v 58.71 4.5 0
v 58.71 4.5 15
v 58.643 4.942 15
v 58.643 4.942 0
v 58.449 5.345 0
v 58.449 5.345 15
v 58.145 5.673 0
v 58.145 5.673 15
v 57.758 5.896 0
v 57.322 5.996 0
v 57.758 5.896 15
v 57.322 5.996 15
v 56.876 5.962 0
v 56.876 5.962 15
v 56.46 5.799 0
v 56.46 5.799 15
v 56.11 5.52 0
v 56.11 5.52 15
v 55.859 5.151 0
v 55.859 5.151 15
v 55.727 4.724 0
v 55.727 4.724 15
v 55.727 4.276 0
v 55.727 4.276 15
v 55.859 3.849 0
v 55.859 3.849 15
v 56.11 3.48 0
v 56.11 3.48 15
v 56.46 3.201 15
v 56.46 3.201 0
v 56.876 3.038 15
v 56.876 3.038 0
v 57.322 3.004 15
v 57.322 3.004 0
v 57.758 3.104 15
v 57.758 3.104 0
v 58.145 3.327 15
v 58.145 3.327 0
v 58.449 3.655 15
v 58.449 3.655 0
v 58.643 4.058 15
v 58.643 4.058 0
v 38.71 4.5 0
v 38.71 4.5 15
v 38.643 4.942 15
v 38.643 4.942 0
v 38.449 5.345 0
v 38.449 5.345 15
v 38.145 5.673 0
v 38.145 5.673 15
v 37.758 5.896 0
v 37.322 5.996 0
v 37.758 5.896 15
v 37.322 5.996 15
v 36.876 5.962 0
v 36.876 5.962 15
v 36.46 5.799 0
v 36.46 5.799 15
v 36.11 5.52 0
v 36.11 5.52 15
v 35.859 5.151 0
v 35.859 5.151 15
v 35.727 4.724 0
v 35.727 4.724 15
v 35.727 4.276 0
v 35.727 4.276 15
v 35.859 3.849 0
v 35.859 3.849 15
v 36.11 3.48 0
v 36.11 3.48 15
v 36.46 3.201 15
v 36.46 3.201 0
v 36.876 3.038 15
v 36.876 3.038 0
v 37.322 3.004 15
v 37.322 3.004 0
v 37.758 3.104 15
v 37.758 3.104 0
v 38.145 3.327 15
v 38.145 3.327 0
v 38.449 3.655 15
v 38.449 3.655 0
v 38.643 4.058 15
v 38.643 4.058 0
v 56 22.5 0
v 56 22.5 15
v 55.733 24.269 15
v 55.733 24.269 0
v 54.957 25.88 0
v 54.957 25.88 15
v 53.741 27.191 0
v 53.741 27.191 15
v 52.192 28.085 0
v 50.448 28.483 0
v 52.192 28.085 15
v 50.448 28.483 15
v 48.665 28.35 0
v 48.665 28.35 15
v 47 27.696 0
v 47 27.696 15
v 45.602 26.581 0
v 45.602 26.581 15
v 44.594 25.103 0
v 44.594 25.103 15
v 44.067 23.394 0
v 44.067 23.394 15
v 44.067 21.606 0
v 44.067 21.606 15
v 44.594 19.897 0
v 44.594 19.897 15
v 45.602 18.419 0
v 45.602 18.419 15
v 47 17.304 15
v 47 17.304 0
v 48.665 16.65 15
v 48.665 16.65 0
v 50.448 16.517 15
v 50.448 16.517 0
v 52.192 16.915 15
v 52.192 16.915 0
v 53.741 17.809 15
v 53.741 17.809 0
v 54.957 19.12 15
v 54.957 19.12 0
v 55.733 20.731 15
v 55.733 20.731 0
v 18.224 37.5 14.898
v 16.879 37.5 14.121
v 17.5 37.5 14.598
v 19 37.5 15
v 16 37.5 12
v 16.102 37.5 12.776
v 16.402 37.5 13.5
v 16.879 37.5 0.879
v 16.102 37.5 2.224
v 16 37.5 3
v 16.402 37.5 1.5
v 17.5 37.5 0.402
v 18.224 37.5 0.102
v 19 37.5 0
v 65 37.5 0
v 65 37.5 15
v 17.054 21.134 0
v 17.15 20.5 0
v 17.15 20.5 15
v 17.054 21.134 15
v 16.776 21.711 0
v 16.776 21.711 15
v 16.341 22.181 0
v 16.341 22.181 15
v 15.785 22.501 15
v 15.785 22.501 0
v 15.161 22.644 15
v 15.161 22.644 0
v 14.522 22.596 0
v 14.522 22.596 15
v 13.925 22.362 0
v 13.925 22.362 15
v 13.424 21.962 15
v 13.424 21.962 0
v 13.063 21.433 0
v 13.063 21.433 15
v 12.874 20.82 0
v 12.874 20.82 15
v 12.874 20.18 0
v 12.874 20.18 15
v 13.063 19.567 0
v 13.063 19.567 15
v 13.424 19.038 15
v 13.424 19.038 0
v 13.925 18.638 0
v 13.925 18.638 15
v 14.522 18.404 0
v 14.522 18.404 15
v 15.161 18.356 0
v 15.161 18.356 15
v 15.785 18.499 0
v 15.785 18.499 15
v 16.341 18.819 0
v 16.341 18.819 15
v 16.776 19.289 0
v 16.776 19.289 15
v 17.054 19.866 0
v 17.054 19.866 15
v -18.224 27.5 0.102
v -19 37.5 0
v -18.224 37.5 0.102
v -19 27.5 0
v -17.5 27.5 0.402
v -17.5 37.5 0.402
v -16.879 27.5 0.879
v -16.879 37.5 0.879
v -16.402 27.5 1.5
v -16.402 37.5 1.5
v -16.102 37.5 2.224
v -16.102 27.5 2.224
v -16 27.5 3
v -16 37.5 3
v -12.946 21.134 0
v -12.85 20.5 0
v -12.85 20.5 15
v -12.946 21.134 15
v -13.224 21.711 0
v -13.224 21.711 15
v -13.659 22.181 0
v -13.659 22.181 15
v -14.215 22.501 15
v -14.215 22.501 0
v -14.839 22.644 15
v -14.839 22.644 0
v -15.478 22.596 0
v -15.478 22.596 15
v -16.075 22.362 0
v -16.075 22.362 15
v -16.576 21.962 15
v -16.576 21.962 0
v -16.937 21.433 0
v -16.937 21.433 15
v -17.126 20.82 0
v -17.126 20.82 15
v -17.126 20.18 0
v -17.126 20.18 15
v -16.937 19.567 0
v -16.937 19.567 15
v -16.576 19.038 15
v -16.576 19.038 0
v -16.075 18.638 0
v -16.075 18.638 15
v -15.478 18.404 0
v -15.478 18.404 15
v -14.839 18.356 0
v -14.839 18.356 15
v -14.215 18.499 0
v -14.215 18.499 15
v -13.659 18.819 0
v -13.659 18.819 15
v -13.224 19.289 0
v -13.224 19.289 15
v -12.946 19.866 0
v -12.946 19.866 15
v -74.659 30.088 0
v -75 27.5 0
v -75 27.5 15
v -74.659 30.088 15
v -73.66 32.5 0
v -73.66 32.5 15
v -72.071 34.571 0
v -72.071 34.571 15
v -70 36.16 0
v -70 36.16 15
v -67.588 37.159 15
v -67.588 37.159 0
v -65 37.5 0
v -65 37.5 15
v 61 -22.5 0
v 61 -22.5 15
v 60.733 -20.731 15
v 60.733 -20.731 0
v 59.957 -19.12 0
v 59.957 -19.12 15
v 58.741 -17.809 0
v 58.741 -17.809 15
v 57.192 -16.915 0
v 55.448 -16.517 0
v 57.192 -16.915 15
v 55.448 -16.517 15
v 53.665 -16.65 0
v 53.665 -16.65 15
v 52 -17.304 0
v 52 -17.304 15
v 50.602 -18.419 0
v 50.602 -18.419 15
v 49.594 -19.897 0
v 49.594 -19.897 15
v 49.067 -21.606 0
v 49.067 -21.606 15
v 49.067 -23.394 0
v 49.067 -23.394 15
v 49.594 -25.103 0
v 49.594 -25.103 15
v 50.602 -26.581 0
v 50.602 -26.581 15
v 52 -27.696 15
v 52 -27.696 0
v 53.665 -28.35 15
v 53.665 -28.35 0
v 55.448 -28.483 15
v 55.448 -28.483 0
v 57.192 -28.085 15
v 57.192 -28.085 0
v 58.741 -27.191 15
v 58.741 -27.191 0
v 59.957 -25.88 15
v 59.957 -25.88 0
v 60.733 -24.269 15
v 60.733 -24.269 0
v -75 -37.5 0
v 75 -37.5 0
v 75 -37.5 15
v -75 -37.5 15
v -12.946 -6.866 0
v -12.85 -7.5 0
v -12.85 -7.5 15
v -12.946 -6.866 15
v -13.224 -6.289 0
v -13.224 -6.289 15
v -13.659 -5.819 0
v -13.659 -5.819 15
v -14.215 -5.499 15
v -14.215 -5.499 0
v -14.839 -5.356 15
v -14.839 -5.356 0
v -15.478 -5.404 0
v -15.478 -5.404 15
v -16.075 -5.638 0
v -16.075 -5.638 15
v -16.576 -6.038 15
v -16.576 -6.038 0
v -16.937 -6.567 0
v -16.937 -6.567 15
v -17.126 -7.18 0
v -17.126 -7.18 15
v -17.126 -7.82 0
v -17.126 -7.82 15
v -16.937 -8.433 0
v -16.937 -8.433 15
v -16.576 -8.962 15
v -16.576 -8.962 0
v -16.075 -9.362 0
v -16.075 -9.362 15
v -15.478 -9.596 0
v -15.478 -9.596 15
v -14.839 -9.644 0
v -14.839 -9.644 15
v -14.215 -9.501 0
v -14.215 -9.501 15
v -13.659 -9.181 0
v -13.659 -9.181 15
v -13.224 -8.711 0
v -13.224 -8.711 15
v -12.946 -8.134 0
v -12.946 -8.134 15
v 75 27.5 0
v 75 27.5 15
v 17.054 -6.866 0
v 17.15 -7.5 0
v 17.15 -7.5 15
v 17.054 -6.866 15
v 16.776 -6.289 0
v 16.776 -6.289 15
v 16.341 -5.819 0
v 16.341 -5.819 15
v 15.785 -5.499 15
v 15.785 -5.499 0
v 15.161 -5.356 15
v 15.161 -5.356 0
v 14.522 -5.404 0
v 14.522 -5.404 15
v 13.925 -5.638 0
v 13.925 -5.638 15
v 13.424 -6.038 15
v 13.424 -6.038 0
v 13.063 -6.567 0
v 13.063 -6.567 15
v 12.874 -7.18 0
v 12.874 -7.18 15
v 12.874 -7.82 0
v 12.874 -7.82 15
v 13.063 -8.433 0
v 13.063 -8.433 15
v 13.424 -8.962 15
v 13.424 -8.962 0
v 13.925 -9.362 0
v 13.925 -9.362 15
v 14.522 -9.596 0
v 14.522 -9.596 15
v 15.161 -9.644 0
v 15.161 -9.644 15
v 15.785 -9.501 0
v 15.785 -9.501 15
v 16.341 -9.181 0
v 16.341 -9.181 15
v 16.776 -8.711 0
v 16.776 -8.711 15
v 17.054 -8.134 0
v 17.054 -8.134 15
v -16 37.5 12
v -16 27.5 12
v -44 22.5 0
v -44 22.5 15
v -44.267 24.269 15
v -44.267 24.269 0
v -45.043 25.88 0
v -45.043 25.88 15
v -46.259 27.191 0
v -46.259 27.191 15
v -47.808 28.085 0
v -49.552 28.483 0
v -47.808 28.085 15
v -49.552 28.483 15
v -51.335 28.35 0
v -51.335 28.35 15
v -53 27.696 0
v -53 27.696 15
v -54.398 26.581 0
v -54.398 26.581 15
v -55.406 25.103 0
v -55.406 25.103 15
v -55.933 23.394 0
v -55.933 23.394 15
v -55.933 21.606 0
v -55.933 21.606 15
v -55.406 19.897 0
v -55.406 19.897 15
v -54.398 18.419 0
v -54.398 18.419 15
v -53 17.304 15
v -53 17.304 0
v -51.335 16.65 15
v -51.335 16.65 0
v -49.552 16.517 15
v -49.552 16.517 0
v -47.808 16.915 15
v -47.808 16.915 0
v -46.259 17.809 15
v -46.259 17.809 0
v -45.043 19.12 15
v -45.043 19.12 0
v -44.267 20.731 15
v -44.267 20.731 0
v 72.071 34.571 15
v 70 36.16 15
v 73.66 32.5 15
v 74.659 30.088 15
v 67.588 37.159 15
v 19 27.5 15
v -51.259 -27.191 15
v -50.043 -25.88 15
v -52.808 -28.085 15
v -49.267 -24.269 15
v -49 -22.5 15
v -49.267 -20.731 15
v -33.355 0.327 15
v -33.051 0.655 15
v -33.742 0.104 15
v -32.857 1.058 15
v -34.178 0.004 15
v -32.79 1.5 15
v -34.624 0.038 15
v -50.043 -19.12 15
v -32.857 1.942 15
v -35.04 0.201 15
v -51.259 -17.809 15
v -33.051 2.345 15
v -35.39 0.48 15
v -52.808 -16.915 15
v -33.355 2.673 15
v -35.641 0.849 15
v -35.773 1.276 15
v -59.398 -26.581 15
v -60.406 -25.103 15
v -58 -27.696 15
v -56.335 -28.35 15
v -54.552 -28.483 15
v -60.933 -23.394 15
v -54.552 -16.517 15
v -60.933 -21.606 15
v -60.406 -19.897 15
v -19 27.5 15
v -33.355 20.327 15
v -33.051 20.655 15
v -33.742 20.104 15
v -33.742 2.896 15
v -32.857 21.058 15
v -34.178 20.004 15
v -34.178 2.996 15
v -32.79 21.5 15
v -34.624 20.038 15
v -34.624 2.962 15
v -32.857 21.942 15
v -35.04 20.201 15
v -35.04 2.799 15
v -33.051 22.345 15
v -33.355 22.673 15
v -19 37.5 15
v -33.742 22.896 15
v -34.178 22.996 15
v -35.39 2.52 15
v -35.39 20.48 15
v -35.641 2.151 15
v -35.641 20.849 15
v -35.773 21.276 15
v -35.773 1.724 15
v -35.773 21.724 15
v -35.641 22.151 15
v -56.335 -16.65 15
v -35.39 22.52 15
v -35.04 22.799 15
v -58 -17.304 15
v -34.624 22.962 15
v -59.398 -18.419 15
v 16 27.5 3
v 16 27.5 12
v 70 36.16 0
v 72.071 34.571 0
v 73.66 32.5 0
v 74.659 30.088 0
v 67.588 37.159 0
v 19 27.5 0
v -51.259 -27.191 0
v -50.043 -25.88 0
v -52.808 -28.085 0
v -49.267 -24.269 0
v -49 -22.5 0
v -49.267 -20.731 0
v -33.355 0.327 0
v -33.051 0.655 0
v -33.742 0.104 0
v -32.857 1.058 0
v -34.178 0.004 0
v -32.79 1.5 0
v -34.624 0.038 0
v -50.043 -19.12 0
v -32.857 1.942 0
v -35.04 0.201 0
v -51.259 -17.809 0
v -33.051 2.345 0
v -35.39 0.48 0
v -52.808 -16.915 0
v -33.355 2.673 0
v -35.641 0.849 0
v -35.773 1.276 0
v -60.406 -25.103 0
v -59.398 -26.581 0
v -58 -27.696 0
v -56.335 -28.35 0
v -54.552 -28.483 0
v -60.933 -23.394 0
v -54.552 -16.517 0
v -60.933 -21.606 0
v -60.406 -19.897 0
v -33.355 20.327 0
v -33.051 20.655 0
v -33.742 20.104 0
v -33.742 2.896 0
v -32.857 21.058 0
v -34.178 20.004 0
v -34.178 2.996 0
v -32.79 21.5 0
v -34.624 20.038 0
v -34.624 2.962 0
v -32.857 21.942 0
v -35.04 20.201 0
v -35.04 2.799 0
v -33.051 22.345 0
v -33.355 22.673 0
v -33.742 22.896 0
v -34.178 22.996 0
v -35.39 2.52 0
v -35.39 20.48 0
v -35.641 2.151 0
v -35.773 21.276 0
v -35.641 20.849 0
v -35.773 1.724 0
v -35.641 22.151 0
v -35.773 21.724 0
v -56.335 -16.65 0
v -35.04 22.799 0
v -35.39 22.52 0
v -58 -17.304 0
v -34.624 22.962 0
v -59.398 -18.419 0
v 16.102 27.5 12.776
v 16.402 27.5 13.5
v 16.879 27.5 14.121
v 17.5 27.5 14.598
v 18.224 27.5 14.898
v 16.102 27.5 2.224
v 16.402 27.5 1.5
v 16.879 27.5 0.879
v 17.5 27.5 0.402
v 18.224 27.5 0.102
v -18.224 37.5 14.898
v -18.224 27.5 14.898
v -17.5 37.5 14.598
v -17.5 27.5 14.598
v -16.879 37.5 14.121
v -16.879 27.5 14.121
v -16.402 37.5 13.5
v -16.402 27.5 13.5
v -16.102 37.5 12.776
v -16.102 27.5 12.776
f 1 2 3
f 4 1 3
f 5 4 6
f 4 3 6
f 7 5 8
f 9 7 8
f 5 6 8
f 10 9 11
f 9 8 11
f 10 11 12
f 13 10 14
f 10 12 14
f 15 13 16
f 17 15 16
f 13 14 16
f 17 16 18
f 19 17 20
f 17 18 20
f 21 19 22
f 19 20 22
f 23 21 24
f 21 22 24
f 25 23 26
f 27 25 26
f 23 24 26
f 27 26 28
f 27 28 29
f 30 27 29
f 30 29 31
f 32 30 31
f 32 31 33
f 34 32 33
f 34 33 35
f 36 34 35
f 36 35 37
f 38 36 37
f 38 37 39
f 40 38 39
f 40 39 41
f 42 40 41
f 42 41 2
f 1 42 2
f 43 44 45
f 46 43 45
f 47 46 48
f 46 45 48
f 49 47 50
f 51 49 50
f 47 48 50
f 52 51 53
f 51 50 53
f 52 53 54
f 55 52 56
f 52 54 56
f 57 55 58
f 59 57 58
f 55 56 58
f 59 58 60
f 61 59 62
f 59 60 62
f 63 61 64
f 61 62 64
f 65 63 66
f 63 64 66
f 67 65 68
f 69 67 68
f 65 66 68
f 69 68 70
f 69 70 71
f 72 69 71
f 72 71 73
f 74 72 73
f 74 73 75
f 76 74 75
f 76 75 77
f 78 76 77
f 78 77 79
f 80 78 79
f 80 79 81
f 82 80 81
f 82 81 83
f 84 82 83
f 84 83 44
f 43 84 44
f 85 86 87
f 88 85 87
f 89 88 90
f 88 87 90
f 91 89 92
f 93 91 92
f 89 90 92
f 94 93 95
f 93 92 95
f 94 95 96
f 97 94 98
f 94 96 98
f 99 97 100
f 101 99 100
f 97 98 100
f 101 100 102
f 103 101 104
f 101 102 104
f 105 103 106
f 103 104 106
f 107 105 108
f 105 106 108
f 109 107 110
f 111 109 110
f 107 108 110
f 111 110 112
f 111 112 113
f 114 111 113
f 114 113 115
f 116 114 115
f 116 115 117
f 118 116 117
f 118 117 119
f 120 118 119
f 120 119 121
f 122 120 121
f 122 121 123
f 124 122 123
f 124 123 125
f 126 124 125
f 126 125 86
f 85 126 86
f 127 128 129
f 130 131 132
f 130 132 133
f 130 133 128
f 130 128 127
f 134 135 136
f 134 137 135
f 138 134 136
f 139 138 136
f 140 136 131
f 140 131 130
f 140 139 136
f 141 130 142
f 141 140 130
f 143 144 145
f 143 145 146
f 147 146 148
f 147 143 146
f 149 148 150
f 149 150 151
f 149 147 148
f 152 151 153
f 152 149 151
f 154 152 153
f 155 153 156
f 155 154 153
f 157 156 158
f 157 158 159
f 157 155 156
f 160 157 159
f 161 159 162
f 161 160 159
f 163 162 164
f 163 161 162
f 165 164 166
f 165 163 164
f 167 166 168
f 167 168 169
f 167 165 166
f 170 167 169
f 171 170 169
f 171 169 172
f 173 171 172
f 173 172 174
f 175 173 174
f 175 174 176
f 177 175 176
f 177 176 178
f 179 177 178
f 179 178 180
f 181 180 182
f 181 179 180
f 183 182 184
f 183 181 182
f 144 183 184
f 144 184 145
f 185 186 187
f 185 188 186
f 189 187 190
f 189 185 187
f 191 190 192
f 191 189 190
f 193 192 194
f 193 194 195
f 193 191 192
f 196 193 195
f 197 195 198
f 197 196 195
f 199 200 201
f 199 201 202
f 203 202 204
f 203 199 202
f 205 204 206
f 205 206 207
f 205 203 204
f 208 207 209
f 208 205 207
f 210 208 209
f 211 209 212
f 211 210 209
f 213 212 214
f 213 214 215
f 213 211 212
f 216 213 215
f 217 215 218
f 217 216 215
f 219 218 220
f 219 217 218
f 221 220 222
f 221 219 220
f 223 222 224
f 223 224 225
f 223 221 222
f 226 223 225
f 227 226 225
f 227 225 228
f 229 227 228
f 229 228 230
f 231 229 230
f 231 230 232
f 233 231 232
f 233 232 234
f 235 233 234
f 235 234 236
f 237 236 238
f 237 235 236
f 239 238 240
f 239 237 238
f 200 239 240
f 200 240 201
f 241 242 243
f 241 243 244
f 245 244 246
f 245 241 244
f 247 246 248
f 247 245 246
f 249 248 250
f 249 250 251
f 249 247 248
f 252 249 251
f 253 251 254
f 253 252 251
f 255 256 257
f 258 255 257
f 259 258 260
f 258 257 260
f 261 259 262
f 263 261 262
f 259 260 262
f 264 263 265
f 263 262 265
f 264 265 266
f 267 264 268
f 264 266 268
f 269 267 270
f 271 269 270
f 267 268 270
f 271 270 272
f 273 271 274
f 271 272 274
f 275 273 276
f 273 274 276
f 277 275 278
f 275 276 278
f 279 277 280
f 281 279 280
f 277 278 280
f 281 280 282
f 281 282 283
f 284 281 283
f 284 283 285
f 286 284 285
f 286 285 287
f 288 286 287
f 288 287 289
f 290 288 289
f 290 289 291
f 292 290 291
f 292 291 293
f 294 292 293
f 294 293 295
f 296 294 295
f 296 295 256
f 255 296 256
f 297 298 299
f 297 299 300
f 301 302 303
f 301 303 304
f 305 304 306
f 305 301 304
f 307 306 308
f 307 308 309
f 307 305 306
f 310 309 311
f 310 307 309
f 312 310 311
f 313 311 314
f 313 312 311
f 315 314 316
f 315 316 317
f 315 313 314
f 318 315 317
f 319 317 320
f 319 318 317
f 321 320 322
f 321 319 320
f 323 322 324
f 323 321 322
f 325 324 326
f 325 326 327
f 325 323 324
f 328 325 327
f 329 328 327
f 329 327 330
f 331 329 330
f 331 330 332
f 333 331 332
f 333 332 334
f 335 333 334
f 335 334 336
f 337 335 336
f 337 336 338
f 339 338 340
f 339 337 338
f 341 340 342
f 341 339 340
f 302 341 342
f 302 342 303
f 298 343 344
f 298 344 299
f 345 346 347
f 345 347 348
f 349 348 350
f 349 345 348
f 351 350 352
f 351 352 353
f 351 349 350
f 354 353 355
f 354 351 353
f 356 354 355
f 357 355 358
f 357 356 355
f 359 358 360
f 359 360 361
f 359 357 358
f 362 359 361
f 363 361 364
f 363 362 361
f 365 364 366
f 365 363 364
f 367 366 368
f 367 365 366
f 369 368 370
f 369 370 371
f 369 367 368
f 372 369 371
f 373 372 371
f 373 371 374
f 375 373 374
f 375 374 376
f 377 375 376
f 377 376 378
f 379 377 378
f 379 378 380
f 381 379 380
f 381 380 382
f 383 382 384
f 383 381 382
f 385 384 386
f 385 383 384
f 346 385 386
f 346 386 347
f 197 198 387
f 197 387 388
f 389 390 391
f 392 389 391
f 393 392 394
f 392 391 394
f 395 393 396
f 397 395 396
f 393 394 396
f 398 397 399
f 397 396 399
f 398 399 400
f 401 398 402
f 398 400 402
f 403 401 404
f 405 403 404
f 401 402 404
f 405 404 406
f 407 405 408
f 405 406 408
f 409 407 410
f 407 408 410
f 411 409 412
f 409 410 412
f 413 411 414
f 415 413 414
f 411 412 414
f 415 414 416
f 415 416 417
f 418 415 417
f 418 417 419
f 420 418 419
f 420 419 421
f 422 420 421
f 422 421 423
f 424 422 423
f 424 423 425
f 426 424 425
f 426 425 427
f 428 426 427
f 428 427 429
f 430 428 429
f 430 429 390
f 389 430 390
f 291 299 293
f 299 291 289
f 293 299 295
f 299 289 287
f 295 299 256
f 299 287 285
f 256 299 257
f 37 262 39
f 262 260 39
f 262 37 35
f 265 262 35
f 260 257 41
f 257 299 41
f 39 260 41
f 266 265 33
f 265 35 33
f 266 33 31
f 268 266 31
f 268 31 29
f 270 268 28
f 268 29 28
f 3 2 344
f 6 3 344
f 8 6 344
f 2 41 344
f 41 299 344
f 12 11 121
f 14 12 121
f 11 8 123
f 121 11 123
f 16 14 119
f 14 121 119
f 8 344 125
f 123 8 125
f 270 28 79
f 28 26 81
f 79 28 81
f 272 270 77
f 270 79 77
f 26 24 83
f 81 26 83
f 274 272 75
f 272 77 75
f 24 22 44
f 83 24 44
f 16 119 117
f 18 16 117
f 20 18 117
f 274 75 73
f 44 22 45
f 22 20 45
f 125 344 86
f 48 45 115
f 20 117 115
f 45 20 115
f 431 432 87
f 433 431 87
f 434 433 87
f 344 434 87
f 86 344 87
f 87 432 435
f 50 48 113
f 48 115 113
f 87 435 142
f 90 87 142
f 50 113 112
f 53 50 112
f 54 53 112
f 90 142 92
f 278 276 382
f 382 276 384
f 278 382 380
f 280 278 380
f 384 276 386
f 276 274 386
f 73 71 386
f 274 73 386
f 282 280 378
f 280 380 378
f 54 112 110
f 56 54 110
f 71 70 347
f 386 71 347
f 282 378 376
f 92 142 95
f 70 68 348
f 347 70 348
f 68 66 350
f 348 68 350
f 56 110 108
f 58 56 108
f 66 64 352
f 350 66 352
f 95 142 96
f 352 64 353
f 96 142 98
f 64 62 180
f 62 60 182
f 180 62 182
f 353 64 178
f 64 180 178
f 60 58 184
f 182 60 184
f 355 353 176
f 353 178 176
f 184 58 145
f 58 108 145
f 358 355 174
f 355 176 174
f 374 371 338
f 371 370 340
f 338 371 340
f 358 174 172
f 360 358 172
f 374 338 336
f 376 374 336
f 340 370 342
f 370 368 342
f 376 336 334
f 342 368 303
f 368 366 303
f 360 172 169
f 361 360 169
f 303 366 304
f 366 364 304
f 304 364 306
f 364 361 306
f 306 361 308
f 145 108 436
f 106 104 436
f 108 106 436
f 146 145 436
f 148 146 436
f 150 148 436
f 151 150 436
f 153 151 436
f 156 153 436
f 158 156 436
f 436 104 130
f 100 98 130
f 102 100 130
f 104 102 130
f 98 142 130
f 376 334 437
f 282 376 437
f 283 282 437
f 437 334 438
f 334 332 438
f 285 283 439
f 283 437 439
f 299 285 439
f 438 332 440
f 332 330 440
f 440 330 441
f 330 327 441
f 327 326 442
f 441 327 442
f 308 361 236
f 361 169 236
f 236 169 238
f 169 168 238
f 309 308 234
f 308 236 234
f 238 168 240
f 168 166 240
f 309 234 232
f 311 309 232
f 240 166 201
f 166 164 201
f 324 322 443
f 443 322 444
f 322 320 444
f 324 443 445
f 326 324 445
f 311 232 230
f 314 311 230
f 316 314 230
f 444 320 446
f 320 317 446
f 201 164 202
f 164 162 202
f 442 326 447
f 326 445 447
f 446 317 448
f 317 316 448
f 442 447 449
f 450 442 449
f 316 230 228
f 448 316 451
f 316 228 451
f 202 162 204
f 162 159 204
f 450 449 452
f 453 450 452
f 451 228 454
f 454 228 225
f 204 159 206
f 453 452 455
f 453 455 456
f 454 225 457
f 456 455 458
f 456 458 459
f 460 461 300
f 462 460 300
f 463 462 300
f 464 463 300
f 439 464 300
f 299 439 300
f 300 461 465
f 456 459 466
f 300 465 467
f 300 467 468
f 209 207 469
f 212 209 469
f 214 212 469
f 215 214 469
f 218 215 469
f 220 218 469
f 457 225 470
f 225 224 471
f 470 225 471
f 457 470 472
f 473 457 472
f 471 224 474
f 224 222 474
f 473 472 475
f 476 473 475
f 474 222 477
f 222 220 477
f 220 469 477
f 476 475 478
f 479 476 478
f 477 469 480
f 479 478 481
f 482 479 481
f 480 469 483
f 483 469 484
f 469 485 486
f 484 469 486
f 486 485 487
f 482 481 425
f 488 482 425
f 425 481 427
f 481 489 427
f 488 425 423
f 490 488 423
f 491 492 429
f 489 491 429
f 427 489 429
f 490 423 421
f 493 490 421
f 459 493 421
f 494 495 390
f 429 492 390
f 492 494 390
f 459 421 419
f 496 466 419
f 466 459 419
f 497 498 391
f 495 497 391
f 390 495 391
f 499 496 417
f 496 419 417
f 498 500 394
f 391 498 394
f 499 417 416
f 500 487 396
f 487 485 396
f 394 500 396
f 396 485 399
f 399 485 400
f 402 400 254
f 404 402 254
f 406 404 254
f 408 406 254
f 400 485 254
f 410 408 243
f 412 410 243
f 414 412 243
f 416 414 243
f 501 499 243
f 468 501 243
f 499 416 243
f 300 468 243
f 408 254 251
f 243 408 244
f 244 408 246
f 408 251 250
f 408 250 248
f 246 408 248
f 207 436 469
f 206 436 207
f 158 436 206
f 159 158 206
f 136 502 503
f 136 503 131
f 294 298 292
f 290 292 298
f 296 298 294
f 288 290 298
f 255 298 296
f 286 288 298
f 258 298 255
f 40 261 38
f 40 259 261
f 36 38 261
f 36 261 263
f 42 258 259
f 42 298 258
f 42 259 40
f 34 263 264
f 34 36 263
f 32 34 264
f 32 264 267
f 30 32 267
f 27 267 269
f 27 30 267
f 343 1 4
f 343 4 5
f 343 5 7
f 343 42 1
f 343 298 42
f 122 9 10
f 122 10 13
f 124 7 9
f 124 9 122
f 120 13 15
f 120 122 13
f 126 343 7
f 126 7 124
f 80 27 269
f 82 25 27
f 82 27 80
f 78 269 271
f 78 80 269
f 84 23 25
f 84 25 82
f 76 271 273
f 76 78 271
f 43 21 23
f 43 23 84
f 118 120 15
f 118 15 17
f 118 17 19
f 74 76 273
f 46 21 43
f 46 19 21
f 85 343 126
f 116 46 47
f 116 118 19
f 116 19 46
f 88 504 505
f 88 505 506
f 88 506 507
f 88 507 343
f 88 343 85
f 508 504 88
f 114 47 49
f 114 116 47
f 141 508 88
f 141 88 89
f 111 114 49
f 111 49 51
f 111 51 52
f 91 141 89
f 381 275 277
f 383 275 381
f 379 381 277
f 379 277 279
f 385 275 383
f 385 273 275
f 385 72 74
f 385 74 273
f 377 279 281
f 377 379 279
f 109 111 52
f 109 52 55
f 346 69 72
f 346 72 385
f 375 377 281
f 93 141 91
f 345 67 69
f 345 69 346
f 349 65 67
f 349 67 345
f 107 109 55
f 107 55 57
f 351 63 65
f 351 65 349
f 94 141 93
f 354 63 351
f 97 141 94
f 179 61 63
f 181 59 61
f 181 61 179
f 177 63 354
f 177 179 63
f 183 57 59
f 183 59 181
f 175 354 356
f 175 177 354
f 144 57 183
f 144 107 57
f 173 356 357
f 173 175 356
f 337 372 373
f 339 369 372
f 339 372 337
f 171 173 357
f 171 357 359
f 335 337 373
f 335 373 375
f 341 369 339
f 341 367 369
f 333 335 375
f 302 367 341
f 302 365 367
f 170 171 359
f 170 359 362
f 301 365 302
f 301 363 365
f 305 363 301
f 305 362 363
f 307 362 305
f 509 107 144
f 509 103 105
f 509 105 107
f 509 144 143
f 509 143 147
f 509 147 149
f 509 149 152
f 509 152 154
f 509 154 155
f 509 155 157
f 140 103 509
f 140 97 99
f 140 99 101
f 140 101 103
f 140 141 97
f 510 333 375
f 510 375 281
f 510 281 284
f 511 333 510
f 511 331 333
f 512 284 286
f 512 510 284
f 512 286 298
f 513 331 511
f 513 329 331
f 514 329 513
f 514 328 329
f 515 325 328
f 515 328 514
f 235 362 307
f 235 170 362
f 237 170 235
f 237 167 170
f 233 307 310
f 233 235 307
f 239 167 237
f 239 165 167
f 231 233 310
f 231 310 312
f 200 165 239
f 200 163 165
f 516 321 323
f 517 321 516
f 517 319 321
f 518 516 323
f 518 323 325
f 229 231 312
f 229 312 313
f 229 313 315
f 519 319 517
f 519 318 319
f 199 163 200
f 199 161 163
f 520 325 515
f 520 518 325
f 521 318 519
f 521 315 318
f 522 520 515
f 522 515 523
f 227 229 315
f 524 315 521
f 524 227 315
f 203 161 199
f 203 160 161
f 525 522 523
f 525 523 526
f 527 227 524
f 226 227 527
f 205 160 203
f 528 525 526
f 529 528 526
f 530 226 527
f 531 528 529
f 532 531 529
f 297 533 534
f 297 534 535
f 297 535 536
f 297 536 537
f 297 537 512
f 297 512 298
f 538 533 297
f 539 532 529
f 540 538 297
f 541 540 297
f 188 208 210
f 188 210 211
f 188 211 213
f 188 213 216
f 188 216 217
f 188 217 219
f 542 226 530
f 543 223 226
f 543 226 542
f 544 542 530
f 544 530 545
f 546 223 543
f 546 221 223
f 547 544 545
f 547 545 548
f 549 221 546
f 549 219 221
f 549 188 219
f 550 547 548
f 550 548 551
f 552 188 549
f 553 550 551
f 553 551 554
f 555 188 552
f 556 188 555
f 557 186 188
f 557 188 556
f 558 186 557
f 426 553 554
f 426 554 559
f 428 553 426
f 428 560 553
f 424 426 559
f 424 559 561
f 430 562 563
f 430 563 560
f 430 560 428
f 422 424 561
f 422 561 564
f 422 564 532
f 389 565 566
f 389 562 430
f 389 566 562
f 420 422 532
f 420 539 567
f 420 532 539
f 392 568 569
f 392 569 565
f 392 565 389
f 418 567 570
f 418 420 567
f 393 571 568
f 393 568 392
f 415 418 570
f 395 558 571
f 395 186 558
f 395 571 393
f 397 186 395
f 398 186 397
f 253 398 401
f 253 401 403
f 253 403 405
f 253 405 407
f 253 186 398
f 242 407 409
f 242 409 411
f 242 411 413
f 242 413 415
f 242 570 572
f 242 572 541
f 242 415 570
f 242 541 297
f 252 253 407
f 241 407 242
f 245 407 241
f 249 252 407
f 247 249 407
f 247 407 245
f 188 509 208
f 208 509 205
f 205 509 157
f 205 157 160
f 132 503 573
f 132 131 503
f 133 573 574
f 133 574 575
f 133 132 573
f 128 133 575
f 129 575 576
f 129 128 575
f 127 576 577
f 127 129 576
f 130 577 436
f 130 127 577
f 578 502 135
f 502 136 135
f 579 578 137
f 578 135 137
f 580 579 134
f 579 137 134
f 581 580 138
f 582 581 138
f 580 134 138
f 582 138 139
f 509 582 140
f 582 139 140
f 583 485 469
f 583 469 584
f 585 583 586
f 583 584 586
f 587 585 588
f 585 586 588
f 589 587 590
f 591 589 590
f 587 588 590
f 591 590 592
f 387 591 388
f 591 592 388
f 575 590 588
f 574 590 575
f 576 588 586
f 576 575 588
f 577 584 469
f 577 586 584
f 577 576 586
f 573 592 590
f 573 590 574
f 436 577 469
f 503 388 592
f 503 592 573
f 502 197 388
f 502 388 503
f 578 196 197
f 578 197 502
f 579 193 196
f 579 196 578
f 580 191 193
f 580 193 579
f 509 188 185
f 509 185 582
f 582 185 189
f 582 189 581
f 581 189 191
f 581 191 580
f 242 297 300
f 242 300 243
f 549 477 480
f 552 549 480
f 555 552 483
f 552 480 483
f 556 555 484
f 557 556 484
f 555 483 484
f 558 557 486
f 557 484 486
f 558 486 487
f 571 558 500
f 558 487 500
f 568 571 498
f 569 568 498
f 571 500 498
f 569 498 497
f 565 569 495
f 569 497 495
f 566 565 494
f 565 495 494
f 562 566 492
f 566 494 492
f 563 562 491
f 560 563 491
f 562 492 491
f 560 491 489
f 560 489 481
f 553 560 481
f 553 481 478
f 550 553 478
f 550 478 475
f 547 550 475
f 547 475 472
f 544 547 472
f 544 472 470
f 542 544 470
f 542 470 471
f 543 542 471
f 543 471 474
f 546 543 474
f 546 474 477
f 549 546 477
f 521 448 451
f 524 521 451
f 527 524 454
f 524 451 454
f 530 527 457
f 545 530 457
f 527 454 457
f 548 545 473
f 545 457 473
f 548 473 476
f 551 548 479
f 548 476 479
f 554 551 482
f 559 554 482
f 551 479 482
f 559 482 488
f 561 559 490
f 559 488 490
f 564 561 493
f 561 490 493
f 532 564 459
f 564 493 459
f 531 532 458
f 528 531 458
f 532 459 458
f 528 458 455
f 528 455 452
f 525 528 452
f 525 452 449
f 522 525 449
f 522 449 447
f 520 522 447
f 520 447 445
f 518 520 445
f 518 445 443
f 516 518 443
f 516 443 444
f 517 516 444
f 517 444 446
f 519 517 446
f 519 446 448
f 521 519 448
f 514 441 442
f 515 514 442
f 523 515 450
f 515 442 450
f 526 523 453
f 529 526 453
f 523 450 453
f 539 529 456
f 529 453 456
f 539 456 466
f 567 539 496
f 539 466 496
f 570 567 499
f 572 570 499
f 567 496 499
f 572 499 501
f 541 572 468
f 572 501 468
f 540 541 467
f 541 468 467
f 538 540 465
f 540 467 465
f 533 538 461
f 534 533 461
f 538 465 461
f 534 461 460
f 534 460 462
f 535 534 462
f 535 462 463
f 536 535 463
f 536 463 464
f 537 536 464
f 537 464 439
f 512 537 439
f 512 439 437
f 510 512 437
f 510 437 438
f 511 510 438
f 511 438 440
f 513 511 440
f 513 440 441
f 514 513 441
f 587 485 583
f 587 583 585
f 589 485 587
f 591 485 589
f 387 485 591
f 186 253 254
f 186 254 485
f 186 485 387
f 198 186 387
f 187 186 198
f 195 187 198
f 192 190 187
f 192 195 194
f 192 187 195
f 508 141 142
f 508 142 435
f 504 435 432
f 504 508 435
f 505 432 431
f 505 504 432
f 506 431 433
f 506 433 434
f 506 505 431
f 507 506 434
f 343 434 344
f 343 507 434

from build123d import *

# Parameters (mm, degrees)
SKETCH_1_R          = 2.15
EXTRUDE_1_DEPTH     = 15
SKETCH_2_R          = 6
CUT_EXTRUDE_1_DEPTH = 86.183625187
FILLET_1_R          = 3
SKETCH_3_R          = 1.5
CUT_EXTRUDE_2_DEPTH = 86.183625187
SKETCH_4_R          = 1.5
CUT_EXTRUDE_3_DEPTH = 86.183625187


with BuildPart() as part:
    # 草图1 → 凸台-拉伸1 (new body)
    with BuildSketch(Plane.XY):
        with BuildLine():
            Line((16, 37.5), (65, 37.5))
            ThreePointArc((65, 37.5), (72.071067812, 34.571067812), (75, 27.5))
            Line((75, 27.5), (75, -37.5))
            Line((75, -37.5), (-75, -37.5))
            Line((-75, -37.5), (-75, 27.5))
            ThreePointArc((-75, 27.5), (-72.071067812, 34.571067812), (-65, 37.5))
            Line((-65, 37.5), (-16, 37.5))
            Line((-16, 37.5), (-16, 27.5))
            Line((-16, 27.5), (16, 27.5))
            Line((16, 27.5), (16, 37.5))
        make_face()
        with Locations((-15, 20.5)):
            Circle(SKETCH_1_R, mode=Mode.SUBTRACT)
        with Locations((15, 20.5)):
            Circle(SKETCH_1_R, mode=Mode.SUBTRACT)
        with Locations((-15, -7.5)):
            Circle(SKETCH_1_R, mode=Mode.SUBTRACT)
        with Locations((15, -7.5)):
            Circle(SKETCH_1_R, mode=Mode.SUBTRACT)
    extrude(amount=EXTRUDE_1_DEPTH)

    # 草图2 → 切除-拉伸1 (cut, through all)
    with BuildSketch(Plane.XY.offset(15)):
        with Locations((-50, 22.5)):
            Circle(SKETCH_2_R)
        with Locations((50, 22.5)):
            Circle(SKETCH_2_R)
        with Locations((-55, -22.5)):
            Circle(SKETCH_2_R)
        with Locations((55, -22.5)):
            Circle(SKETCH_2_R)
    extrude(amount=-CUT_EXTRUDE_1_DEPTH, mode=Mode.SUBTRACT)

    # 圆角1
    fillet_1_edges = [part.edges().sort_by_distance(p)[0] for p in [
        (-16, 32.5, 15),
        (16, 32.5, 0),
        (-16, 32.5, 0),
        (16, 32.5, 15),
    ]]
    fillet(fillet_1_edges, radius=FILLET_1_R)

    # 草图3 → 切除-拉伸2 (cut, through all)
    with BuildSketch(Plane.XY.offset(15)):
        with Locations((-34.29, 1.5)):
            Circle(SKETCH_3_R)
        with Locations((-34.29, 21.5)):
            Circle(SKETCH_3_R)
    extrude(amount=-CUT_EXTRUDE_2_DEPTH, mode=Mode.SUBTRACT)

    # 草图4 → 切除-拉伸3 (cut, through all)
    with BuildSketch(Plane.XY.offset(15)):
        with Locations((57.21, 4.5)):
            Circle(SKETCH_4_R)
        with Locations((37.21, 4.5)):
            Circle(SKETCH_4_R)
    extrude(amount=-CUT_EXTRUDE_3_DEPTH, mode=Mode.SUBTRACT)


solid = part.part
